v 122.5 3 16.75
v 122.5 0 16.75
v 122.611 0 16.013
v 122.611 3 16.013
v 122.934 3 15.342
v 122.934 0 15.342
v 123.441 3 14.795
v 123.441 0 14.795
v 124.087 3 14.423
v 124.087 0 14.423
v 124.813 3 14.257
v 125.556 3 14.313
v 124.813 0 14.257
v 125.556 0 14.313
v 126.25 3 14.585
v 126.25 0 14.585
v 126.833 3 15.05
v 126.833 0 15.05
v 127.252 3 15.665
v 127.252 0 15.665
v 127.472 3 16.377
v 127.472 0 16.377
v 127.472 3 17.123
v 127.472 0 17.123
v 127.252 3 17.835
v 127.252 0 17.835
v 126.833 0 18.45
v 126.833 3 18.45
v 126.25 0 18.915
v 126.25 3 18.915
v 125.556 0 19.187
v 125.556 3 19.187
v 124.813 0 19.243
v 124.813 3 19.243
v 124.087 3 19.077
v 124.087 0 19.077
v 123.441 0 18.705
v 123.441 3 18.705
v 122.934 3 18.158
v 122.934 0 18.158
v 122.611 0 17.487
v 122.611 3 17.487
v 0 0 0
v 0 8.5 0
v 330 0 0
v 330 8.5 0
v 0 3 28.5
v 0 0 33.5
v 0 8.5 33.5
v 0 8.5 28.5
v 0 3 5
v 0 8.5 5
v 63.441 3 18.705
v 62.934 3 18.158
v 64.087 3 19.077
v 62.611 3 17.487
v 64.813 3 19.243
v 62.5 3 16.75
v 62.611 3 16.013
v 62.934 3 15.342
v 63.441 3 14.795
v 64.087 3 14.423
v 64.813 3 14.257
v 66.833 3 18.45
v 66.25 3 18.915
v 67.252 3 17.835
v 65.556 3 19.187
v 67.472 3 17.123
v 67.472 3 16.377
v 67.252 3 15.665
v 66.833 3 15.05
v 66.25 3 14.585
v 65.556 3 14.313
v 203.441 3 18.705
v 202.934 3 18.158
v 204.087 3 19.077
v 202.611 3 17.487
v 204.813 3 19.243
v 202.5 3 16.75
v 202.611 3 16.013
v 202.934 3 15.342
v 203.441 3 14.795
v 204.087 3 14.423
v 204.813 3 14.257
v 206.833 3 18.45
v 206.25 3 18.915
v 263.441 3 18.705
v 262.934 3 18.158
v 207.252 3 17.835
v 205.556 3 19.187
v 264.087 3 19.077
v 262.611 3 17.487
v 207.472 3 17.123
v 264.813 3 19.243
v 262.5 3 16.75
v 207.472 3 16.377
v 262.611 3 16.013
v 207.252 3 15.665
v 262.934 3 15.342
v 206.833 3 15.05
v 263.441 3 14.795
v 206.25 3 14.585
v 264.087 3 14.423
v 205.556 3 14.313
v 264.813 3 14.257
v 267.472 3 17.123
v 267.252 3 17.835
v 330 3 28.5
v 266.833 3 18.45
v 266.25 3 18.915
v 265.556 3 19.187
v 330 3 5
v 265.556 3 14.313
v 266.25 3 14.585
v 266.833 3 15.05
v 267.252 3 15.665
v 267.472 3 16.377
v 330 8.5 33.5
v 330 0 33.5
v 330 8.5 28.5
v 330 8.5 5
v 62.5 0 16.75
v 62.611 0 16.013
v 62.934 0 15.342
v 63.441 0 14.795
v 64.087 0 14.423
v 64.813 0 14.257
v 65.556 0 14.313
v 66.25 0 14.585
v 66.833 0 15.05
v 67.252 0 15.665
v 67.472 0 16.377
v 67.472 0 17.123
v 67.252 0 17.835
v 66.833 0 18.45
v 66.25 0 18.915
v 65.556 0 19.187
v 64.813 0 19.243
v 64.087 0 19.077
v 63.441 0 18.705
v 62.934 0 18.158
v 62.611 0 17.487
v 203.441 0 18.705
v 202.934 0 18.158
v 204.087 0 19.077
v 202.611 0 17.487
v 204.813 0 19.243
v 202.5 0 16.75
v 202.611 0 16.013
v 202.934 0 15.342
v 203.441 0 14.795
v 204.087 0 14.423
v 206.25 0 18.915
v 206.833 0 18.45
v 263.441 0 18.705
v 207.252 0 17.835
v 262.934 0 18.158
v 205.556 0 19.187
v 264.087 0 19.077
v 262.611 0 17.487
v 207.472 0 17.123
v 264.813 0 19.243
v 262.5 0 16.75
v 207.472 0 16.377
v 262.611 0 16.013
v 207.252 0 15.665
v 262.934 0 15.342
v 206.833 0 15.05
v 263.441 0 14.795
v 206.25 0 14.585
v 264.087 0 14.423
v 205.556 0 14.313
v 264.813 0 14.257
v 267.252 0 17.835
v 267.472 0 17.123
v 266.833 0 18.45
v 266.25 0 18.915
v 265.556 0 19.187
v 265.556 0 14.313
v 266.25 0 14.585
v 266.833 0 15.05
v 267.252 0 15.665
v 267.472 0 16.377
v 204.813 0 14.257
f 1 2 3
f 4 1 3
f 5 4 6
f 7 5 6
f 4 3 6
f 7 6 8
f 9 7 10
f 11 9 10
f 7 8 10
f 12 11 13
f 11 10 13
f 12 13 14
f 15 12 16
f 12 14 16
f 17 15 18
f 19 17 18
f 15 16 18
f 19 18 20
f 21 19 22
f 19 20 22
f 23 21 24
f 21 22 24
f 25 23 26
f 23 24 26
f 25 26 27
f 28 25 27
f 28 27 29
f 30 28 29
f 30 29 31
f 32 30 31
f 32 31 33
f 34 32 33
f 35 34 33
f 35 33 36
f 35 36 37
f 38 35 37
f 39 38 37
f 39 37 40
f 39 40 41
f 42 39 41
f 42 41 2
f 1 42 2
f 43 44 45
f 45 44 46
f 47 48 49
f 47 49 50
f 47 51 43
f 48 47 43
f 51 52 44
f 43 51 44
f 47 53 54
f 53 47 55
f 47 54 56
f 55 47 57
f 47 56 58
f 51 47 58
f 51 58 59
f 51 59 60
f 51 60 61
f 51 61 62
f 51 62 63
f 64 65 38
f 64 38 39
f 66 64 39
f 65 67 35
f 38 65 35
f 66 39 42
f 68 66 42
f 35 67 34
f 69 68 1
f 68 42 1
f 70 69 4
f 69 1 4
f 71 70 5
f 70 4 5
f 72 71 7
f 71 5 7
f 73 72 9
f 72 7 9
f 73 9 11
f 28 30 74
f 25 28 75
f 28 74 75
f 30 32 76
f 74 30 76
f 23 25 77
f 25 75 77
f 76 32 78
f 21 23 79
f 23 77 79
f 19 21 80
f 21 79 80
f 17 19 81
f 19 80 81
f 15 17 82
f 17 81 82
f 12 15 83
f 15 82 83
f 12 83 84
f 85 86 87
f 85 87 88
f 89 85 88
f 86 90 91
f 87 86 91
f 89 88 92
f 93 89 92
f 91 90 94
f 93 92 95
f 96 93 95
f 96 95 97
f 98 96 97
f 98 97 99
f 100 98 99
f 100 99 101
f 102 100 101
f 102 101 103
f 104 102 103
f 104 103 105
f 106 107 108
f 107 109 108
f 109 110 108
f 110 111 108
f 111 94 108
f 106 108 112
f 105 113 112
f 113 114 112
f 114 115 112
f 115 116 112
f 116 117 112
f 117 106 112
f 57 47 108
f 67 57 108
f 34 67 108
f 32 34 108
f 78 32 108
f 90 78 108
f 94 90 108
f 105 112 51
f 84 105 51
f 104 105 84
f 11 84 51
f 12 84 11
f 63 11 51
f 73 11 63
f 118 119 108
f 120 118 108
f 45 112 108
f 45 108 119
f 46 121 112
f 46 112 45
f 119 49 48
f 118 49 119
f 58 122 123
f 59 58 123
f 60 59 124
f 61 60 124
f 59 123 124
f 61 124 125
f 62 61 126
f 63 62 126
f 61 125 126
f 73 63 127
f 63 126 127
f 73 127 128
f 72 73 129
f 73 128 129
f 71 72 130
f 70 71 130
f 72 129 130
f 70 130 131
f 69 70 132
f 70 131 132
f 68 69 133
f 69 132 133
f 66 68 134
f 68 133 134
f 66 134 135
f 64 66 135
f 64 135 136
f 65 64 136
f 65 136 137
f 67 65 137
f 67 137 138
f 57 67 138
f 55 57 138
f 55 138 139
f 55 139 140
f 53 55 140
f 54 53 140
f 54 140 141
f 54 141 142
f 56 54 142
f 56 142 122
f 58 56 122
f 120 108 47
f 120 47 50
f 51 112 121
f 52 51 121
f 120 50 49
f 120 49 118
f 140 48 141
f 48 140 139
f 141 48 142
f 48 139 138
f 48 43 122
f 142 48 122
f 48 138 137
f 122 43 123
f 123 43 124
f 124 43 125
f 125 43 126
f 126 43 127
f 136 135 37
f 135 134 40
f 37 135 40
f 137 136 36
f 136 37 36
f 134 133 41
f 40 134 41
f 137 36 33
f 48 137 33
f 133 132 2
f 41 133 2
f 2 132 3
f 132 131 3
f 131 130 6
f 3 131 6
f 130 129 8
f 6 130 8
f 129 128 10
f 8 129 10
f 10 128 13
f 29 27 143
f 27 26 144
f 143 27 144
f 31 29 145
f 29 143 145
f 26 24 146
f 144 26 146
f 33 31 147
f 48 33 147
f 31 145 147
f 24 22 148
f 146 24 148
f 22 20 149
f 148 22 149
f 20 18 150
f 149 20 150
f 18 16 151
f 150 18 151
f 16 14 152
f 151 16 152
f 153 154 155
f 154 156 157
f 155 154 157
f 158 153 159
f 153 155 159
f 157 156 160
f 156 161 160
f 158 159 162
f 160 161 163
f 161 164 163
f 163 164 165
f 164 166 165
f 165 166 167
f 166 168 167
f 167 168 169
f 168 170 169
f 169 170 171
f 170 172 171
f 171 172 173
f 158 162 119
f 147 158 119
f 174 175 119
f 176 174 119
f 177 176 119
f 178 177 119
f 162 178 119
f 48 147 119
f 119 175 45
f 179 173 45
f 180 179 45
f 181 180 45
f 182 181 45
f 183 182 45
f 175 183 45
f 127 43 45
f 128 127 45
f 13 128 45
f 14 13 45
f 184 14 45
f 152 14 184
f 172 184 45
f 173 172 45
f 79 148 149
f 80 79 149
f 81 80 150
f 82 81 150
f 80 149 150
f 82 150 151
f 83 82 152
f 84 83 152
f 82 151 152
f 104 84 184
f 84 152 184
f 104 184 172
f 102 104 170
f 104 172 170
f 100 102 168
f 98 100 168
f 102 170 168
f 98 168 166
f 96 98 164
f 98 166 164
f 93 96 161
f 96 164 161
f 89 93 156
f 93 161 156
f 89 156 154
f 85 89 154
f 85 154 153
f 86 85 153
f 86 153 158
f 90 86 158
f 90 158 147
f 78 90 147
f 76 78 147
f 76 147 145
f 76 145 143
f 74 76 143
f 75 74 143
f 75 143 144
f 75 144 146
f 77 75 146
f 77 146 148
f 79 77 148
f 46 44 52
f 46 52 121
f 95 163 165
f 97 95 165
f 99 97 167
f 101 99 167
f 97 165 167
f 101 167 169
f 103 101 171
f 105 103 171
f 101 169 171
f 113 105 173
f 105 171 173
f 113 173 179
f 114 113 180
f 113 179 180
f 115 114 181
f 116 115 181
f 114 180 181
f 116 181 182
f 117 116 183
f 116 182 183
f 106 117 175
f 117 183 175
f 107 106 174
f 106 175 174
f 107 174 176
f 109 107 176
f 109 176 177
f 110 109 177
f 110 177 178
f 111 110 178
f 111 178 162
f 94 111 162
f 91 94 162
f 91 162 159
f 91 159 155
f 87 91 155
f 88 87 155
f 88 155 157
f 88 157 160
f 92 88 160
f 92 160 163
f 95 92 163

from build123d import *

# Parameters (mm, degrees)
SKETCH_1_W            = 330
SKETCH_1_H            = 33.5
EXTRUDE_1_DEPTH       = 8.5
SKETCH_2_W            = 23.5
SKETCH_2_H            = 5.5
CUT_EXTRUDE_1_DEPTH   = 332.804912562
HOLE_WIZARD_5_0_5_1_D = 5


with BuildPart() as part:
    # Эскиз1 → Бобышка-Вытянуть1 (new body)
    with BuildSketch(Plane(origin=(0, 8.5, 0), x_dir=(1, 0, 0), z_dir=(0, 1, 0))):
        with Locations((165, -16.75)):
            Rectangle(SKETCH_1_W, SKETCH_1_H)
    extrude(amount=-EXTRUDE_1_DEPTH)

    # Эскиз2 → Вырез-Вытянуть1 (cut, through all)
    with BuildSketch(Plane(origin=(330, 0, 0), x_dir=(0, 0, -1), z_dir=(1, 0, 0))):
        with Locations((-16.75, 5.75)):
            Rectangle(SKETCH_2_W, SKETCH_2_H)
    extrude(amount=-CUT_EXTRUDE_1_DEPTH, mode=Mode.SUBTRACT)

    # Диаметр отверстия Ø5.0 (5)1 (through all)
    with Locations(Plane(origin=(0, 3, 0), x_dir=(1, 0, 0), z_dir=(0, 1, 0))):
        with Locations((65, -16.75), (125, -16.75), (265, -16.75), (205, -16.75)):
            Hole(HOLE_WIZARD_5_0_5_1_D / 2)


solid = part.part
